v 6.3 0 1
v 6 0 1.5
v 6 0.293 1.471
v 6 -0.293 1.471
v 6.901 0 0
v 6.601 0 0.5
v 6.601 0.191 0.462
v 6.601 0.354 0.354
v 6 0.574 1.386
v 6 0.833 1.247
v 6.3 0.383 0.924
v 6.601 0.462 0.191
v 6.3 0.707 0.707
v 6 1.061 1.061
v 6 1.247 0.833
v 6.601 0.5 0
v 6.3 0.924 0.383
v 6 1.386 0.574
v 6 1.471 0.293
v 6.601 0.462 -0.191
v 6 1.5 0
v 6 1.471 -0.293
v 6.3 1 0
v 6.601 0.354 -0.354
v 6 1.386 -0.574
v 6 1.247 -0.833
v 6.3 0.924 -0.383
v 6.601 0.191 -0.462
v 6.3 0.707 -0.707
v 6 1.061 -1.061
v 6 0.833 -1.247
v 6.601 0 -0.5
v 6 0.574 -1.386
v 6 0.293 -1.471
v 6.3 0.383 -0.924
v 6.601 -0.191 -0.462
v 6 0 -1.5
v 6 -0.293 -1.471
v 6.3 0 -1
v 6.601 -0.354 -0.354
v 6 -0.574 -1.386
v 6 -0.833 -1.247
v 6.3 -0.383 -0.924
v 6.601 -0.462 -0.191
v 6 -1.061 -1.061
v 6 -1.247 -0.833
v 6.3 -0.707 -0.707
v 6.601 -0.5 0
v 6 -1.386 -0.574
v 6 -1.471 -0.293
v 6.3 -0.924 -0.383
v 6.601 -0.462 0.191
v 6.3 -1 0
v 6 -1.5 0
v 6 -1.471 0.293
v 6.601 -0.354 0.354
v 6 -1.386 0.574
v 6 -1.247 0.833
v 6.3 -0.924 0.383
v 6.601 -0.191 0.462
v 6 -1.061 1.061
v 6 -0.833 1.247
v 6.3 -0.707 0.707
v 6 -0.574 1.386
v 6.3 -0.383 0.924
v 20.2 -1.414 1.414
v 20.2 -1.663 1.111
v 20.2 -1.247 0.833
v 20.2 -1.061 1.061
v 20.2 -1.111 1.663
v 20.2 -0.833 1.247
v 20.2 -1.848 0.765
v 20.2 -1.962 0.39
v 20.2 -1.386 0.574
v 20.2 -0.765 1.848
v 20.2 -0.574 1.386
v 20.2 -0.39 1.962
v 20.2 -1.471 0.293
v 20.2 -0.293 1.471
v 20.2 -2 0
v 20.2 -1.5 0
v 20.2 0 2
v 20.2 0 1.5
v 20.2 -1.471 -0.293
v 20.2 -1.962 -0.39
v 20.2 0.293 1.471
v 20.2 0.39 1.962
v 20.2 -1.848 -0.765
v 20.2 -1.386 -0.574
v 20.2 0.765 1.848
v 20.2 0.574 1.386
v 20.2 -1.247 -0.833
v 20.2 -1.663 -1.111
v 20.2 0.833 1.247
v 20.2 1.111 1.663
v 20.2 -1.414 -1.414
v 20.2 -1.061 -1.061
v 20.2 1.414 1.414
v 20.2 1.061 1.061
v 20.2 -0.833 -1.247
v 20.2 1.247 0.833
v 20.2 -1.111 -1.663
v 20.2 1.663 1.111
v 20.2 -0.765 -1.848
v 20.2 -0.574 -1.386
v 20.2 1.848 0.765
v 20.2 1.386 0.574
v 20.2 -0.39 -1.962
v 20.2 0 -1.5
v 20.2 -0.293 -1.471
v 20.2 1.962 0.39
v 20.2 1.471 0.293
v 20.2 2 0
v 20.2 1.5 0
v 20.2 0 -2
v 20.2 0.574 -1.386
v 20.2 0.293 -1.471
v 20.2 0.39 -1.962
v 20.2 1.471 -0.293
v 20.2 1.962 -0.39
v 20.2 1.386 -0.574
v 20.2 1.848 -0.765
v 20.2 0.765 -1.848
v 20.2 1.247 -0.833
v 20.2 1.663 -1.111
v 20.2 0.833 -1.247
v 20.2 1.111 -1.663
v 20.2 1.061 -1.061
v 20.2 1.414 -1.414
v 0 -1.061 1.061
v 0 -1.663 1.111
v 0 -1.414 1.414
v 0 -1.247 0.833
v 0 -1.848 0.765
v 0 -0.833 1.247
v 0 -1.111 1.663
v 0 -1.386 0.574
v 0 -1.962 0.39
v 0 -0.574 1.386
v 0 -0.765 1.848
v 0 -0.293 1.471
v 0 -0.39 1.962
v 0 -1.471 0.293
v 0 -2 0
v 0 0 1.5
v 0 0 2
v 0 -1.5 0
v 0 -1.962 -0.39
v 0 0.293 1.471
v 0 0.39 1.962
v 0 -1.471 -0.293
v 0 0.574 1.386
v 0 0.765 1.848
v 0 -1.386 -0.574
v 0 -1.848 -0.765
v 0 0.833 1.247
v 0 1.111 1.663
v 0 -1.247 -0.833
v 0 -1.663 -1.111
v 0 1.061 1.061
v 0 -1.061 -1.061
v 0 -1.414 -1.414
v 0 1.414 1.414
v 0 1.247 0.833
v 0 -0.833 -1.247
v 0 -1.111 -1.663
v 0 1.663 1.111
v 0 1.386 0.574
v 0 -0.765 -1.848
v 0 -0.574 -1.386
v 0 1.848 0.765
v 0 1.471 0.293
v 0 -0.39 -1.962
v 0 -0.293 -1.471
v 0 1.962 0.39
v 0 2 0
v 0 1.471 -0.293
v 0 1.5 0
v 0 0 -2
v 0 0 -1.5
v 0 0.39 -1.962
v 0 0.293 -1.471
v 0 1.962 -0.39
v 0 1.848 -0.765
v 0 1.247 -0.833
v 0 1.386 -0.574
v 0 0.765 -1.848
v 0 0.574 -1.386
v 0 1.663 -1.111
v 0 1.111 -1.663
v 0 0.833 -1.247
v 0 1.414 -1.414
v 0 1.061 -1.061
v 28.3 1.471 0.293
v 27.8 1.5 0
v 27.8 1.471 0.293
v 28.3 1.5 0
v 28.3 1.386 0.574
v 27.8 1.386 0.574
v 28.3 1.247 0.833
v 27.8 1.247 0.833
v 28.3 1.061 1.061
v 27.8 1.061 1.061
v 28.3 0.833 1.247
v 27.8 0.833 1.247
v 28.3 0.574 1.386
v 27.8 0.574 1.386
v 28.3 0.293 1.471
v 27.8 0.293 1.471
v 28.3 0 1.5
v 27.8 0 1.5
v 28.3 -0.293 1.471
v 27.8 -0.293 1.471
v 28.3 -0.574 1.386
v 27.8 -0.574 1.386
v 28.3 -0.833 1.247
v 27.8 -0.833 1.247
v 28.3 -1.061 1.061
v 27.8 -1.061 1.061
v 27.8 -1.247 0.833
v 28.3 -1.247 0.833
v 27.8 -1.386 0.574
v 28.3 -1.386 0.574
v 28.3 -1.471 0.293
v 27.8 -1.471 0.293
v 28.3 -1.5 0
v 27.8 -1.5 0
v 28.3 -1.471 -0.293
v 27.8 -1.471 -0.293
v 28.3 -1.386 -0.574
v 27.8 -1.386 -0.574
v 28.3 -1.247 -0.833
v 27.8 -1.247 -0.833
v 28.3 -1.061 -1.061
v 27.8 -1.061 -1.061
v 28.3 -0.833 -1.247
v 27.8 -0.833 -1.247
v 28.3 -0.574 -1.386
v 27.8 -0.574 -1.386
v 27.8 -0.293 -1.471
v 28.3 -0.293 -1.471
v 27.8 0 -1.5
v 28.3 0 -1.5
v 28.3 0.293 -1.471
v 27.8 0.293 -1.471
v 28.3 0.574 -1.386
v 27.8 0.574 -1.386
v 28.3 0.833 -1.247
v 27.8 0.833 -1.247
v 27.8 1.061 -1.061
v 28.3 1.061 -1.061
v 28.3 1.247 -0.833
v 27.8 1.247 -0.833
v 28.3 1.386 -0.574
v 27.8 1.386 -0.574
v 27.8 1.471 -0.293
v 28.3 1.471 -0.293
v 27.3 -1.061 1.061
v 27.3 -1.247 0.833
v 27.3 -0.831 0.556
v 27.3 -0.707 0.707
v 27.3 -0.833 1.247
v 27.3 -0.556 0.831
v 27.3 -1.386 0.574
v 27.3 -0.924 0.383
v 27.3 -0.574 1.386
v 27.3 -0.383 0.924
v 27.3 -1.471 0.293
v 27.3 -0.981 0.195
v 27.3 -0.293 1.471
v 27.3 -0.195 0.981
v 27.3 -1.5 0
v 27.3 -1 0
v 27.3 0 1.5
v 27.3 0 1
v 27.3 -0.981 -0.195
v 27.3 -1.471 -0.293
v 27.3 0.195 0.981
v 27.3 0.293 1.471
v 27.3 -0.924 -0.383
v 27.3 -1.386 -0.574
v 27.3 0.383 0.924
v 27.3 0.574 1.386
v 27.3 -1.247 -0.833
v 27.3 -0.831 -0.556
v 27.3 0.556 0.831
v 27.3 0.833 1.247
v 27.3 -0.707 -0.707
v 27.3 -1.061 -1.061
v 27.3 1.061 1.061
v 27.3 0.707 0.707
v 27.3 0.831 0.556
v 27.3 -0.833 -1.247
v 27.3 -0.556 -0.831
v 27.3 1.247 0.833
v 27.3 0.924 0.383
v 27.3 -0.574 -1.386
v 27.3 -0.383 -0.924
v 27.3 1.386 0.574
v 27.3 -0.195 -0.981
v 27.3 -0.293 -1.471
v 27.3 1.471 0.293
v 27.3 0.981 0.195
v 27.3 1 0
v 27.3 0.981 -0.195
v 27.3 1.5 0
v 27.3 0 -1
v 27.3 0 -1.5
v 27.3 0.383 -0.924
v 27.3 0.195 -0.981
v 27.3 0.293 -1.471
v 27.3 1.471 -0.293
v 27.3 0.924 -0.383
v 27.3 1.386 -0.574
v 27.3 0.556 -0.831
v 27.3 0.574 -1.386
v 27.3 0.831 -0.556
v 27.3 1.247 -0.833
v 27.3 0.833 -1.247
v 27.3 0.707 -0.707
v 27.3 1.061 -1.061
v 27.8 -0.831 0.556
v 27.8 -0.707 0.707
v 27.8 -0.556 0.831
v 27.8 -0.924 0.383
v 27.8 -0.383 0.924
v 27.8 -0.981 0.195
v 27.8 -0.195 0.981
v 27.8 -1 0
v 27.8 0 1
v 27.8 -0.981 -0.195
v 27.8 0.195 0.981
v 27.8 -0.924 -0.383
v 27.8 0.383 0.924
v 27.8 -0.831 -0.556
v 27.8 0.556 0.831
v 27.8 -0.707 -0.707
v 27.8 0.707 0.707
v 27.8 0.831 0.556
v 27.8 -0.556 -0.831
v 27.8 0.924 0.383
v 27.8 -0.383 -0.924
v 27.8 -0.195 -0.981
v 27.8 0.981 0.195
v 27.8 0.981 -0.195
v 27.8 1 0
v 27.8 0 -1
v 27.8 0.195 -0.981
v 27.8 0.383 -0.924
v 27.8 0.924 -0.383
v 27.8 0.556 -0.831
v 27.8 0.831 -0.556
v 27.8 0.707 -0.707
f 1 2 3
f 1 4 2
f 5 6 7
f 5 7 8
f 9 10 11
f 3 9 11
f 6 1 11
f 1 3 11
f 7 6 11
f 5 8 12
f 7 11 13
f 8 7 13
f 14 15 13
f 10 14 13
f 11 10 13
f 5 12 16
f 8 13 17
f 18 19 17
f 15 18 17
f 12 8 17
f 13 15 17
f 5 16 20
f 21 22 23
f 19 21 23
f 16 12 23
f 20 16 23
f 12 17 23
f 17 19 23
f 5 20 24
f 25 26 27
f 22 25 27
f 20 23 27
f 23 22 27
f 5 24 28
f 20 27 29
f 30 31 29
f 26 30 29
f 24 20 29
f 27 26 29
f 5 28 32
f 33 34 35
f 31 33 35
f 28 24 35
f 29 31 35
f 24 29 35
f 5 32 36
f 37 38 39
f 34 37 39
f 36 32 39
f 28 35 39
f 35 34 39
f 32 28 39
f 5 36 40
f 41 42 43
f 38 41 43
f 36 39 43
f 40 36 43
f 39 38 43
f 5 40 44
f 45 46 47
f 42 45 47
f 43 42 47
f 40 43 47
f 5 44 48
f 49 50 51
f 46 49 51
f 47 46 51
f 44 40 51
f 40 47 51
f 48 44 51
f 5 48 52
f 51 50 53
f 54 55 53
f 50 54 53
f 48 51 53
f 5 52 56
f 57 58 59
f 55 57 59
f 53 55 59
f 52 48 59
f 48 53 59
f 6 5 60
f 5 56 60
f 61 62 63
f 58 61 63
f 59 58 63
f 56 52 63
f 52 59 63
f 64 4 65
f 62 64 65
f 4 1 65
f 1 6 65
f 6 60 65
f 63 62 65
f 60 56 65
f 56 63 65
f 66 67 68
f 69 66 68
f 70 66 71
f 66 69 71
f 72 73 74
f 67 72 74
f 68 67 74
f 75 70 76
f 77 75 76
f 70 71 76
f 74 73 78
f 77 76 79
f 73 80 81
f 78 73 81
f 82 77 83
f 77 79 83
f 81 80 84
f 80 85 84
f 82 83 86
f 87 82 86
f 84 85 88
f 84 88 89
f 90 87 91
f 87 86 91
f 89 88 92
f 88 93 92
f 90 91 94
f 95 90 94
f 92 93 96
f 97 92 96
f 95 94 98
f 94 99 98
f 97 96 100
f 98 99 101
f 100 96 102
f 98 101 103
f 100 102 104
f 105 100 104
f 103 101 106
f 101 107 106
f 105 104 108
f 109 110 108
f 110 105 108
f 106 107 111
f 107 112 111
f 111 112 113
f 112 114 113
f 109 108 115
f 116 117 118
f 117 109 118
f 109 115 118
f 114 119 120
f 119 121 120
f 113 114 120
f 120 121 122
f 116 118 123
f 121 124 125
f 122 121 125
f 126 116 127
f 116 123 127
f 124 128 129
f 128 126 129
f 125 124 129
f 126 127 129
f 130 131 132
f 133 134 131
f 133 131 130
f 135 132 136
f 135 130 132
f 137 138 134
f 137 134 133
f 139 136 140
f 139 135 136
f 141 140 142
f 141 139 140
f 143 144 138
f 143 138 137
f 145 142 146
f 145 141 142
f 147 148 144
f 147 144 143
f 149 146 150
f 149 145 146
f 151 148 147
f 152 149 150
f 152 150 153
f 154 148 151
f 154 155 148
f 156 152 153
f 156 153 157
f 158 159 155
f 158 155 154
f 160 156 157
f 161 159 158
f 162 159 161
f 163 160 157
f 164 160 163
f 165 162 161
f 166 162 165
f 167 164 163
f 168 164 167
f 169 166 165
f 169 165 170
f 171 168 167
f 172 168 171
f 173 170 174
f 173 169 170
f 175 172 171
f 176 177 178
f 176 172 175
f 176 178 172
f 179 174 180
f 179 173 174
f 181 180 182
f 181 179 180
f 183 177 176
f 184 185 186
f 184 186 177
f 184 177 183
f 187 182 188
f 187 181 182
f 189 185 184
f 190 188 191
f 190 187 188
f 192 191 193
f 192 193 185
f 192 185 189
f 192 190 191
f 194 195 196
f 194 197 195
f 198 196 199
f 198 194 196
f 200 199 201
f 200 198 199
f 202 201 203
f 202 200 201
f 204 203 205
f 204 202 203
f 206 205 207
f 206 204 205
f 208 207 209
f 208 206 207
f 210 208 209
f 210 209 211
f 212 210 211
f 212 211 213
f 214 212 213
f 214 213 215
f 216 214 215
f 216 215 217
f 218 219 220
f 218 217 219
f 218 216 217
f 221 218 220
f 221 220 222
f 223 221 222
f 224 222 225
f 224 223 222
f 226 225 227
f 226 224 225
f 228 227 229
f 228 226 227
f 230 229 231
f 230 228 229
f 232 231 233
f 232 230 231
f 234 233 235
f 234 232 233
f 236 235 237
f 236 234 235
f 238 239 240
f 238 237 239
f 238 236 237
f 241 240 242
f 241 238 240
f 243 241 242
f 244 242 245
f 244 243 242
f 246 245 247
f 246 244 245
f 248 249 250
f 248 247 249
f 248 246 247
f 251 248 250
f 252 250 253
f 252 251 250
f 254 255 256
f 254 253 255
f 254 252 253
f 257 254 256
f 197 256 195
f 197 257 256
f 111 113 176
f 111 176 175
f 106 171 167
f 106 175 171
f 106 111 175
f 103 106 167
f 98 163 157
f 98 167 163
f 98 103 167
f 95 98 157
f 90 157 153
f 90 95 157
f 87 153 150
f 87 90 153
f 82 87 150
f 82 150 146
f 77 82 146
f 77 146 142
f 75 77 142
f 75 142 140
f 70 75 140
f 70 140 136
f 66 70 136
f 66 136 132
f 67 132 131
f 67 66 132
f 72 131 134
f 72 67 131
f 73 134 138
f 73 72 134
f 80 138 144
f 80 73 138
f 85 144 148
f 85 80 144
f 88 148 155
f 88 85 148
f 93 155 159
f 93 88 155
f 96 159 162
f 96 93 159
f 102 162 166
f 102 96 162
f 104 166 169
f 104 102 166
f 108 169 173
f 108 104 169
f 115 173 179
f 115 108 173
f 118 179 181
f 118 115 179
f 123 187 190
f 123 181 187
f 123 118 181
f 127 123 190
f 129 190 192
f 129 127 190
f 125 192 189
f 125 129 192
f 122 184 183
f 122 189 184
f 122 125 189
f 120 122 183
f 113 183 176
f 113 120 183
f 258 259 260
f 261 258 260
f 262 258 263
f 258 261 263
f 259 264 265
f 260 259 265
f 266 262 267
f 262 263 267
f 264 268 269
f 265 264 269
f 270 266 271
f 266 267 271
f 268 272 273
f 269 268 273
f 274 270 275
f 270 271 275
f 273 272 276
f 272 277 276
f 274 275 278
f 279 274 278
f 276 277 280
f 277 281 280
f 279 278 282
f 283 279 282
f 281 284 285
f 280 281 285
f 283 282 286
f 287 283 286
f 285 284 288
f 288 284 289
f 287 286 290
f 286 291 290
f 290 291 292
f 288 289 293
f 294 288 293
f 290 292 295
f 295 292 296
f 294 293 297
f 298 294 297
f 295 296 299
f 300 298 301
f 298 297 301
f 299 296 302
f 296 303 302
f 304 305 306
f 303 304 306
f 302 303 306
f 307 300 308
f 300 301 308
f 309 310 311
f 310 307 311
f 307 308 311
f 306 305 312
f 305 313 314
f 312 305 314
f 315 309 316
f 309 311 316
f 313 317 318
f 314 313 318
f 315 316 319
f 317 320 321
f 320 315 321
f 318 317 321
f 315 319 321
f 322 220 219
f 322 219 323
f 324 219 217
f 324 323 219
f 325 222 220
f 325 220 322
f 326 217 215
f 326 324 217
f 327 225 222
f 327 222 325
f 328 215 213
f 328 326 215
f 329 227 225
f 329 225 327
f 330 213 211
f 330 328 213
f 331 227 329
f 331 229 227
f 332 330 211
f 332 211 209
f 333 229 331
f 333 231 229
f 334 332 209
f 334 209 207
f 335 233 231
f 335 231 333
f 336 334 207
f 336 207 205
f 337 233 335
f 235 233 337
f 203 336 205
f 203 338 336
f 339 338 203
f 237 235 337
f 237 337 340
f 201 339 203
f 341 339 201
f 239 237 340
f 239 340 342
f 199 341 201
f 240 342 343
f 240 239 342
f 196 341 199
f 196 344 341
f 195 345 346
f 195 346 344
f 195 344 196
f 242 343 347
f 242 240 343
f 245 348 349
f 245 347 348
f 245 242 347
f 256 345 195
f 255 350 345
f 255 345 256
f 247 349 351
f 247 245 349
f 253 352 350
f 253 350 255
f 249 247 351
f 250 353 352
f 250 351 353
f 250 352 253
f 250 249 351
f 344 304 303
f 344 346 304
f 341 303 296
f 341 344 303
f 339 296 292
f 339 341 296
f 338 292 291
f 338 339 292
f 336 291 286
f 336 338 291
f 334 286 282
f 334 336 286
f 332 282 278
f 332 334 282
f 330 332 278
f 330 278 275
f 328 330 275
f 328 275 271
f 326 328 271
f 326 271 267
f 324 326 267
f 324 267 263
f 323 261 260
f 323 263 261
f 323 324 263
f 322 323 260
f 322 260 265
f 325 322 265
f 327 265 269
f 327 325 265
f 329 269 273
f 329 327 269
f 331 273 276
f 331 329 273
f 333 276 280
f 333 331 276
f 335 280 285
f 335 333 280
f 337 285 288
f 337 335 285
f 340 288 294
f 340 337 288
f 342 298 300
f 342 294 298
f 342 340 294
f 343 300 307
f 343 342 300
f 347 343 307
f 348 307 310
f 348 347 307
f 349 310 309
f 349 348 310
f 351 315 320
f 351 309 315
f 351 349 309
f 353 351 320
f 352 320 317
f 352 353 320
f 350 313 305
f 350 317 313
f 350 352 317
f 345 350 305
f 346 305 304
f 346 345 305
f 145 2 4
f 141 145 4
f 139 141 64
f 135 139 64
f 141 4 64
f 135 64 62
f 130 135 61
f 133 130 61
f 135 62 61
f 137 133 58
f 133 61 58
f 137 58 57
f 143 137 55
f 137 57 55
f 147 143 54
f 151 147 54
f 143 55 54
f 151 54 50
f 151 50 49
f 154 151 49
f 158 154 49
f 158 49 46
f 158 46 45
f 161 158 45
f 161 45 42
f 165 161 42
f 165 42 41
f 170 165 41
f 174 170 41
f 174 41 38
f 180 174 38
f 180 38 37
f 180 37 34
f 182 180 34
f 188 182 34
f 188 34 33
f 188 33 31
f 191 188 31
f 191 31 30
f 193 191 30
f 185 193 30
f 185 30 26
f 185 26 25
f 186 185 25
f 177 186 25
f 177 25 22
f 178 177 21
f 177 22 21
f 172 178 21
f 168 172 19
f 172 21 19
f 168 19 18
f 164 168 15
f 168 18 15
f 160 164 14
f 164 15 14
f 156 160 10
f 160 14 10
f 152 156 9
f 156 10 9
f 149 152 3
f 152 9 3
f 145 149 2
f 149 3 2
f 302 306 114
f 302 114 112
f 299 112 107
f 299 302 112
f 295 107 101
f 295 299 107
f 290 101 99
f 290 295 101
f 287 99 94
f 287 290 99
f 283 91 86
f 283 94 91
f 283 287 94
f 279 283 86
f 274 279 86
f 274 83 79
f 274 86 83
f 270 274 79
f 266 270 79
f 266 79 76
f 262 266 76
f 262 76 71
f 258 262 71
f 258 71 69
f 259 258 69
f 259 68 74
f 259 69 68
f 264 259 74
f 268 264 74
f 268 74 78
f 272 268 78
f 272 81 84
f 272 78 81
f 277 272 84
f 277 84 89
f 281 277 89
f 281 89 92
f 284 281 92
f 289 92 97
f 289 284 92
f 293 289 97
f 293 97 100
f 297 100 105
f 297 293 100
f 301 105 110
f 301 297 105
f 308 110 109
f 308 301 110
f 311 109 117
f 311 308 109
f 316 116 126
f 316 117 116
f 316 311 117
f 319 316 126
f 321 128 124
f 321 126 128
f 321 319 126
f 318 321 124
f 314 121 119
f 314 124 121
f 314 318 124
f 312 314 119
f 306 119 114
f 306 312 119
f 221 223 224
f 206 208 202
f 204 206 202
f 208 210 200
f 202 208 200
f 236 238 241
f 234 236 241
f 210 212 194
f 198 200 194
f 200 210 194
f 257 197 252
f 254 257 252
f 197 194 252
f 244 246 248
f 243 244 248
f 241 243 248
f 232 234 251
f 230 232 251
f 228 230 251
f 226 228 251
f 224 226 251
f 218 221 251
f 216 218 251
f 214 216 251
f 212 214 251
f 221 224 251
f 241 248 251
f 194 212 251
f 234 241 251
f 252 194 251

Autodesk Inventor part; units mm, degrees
ref_plane "YZ Plane" through (0, 0, 0) normal (1, 0, 0) x (0, 1, 0)
ref_plane "XZ Plane" through (0, 0, 0) normal (0, 1, 0) x (-1, 0, 0)
ref_plane "XY Plane" through (0, 0, 0) normal (0, 0, 1) x (1, 0, 0)
sketch "Sketch1" plane through (0, 0, 0) normal (0, 0, 1) x (1, 0, 0)
  line L0 (0, 0) -> (0, 2)
  line L1 (0, 2) -> (20.2, 2)
  line L2 (20.2, 2) -> (20.2, 1.5)
  line L3 (20.2, 1.5) -> (27.3, 1.5)
  line L4 (27.3, 1.5) -> (27.3, 1)
  line L5 (27.3, 1) -> (27.8, 1)
  line L6 (27.8, 1) -> (27.8, 1.5)
  line L7 (27.8, 1.5) -> (28.3, 1.5)
  line L8 (28.3, 1.5) -> (28.3, 0)
  line L9 (28.3, 0) -> (0, 0)
  dimension "d0" = 4
  dimension "d1" = 3
  dimension "d2" = 0.5
  dimension "d3" = 0.5
  dimension "d4" = 0.5
  dimension "d5" = 7.1
  dimension "d6" = 20.2
revolve "Revolution1" add sketch "Sketch1" angle 360 about axis through (28.3, 0, 0) along (-1, 0, 0)
hole "Hole1" at (0, 0, 0) direction (1, 0, 0) diameter 3 depth 6 tip angle 118
properties part number "thumb_opposing_worm_shaft" material "Stainless Steel"
